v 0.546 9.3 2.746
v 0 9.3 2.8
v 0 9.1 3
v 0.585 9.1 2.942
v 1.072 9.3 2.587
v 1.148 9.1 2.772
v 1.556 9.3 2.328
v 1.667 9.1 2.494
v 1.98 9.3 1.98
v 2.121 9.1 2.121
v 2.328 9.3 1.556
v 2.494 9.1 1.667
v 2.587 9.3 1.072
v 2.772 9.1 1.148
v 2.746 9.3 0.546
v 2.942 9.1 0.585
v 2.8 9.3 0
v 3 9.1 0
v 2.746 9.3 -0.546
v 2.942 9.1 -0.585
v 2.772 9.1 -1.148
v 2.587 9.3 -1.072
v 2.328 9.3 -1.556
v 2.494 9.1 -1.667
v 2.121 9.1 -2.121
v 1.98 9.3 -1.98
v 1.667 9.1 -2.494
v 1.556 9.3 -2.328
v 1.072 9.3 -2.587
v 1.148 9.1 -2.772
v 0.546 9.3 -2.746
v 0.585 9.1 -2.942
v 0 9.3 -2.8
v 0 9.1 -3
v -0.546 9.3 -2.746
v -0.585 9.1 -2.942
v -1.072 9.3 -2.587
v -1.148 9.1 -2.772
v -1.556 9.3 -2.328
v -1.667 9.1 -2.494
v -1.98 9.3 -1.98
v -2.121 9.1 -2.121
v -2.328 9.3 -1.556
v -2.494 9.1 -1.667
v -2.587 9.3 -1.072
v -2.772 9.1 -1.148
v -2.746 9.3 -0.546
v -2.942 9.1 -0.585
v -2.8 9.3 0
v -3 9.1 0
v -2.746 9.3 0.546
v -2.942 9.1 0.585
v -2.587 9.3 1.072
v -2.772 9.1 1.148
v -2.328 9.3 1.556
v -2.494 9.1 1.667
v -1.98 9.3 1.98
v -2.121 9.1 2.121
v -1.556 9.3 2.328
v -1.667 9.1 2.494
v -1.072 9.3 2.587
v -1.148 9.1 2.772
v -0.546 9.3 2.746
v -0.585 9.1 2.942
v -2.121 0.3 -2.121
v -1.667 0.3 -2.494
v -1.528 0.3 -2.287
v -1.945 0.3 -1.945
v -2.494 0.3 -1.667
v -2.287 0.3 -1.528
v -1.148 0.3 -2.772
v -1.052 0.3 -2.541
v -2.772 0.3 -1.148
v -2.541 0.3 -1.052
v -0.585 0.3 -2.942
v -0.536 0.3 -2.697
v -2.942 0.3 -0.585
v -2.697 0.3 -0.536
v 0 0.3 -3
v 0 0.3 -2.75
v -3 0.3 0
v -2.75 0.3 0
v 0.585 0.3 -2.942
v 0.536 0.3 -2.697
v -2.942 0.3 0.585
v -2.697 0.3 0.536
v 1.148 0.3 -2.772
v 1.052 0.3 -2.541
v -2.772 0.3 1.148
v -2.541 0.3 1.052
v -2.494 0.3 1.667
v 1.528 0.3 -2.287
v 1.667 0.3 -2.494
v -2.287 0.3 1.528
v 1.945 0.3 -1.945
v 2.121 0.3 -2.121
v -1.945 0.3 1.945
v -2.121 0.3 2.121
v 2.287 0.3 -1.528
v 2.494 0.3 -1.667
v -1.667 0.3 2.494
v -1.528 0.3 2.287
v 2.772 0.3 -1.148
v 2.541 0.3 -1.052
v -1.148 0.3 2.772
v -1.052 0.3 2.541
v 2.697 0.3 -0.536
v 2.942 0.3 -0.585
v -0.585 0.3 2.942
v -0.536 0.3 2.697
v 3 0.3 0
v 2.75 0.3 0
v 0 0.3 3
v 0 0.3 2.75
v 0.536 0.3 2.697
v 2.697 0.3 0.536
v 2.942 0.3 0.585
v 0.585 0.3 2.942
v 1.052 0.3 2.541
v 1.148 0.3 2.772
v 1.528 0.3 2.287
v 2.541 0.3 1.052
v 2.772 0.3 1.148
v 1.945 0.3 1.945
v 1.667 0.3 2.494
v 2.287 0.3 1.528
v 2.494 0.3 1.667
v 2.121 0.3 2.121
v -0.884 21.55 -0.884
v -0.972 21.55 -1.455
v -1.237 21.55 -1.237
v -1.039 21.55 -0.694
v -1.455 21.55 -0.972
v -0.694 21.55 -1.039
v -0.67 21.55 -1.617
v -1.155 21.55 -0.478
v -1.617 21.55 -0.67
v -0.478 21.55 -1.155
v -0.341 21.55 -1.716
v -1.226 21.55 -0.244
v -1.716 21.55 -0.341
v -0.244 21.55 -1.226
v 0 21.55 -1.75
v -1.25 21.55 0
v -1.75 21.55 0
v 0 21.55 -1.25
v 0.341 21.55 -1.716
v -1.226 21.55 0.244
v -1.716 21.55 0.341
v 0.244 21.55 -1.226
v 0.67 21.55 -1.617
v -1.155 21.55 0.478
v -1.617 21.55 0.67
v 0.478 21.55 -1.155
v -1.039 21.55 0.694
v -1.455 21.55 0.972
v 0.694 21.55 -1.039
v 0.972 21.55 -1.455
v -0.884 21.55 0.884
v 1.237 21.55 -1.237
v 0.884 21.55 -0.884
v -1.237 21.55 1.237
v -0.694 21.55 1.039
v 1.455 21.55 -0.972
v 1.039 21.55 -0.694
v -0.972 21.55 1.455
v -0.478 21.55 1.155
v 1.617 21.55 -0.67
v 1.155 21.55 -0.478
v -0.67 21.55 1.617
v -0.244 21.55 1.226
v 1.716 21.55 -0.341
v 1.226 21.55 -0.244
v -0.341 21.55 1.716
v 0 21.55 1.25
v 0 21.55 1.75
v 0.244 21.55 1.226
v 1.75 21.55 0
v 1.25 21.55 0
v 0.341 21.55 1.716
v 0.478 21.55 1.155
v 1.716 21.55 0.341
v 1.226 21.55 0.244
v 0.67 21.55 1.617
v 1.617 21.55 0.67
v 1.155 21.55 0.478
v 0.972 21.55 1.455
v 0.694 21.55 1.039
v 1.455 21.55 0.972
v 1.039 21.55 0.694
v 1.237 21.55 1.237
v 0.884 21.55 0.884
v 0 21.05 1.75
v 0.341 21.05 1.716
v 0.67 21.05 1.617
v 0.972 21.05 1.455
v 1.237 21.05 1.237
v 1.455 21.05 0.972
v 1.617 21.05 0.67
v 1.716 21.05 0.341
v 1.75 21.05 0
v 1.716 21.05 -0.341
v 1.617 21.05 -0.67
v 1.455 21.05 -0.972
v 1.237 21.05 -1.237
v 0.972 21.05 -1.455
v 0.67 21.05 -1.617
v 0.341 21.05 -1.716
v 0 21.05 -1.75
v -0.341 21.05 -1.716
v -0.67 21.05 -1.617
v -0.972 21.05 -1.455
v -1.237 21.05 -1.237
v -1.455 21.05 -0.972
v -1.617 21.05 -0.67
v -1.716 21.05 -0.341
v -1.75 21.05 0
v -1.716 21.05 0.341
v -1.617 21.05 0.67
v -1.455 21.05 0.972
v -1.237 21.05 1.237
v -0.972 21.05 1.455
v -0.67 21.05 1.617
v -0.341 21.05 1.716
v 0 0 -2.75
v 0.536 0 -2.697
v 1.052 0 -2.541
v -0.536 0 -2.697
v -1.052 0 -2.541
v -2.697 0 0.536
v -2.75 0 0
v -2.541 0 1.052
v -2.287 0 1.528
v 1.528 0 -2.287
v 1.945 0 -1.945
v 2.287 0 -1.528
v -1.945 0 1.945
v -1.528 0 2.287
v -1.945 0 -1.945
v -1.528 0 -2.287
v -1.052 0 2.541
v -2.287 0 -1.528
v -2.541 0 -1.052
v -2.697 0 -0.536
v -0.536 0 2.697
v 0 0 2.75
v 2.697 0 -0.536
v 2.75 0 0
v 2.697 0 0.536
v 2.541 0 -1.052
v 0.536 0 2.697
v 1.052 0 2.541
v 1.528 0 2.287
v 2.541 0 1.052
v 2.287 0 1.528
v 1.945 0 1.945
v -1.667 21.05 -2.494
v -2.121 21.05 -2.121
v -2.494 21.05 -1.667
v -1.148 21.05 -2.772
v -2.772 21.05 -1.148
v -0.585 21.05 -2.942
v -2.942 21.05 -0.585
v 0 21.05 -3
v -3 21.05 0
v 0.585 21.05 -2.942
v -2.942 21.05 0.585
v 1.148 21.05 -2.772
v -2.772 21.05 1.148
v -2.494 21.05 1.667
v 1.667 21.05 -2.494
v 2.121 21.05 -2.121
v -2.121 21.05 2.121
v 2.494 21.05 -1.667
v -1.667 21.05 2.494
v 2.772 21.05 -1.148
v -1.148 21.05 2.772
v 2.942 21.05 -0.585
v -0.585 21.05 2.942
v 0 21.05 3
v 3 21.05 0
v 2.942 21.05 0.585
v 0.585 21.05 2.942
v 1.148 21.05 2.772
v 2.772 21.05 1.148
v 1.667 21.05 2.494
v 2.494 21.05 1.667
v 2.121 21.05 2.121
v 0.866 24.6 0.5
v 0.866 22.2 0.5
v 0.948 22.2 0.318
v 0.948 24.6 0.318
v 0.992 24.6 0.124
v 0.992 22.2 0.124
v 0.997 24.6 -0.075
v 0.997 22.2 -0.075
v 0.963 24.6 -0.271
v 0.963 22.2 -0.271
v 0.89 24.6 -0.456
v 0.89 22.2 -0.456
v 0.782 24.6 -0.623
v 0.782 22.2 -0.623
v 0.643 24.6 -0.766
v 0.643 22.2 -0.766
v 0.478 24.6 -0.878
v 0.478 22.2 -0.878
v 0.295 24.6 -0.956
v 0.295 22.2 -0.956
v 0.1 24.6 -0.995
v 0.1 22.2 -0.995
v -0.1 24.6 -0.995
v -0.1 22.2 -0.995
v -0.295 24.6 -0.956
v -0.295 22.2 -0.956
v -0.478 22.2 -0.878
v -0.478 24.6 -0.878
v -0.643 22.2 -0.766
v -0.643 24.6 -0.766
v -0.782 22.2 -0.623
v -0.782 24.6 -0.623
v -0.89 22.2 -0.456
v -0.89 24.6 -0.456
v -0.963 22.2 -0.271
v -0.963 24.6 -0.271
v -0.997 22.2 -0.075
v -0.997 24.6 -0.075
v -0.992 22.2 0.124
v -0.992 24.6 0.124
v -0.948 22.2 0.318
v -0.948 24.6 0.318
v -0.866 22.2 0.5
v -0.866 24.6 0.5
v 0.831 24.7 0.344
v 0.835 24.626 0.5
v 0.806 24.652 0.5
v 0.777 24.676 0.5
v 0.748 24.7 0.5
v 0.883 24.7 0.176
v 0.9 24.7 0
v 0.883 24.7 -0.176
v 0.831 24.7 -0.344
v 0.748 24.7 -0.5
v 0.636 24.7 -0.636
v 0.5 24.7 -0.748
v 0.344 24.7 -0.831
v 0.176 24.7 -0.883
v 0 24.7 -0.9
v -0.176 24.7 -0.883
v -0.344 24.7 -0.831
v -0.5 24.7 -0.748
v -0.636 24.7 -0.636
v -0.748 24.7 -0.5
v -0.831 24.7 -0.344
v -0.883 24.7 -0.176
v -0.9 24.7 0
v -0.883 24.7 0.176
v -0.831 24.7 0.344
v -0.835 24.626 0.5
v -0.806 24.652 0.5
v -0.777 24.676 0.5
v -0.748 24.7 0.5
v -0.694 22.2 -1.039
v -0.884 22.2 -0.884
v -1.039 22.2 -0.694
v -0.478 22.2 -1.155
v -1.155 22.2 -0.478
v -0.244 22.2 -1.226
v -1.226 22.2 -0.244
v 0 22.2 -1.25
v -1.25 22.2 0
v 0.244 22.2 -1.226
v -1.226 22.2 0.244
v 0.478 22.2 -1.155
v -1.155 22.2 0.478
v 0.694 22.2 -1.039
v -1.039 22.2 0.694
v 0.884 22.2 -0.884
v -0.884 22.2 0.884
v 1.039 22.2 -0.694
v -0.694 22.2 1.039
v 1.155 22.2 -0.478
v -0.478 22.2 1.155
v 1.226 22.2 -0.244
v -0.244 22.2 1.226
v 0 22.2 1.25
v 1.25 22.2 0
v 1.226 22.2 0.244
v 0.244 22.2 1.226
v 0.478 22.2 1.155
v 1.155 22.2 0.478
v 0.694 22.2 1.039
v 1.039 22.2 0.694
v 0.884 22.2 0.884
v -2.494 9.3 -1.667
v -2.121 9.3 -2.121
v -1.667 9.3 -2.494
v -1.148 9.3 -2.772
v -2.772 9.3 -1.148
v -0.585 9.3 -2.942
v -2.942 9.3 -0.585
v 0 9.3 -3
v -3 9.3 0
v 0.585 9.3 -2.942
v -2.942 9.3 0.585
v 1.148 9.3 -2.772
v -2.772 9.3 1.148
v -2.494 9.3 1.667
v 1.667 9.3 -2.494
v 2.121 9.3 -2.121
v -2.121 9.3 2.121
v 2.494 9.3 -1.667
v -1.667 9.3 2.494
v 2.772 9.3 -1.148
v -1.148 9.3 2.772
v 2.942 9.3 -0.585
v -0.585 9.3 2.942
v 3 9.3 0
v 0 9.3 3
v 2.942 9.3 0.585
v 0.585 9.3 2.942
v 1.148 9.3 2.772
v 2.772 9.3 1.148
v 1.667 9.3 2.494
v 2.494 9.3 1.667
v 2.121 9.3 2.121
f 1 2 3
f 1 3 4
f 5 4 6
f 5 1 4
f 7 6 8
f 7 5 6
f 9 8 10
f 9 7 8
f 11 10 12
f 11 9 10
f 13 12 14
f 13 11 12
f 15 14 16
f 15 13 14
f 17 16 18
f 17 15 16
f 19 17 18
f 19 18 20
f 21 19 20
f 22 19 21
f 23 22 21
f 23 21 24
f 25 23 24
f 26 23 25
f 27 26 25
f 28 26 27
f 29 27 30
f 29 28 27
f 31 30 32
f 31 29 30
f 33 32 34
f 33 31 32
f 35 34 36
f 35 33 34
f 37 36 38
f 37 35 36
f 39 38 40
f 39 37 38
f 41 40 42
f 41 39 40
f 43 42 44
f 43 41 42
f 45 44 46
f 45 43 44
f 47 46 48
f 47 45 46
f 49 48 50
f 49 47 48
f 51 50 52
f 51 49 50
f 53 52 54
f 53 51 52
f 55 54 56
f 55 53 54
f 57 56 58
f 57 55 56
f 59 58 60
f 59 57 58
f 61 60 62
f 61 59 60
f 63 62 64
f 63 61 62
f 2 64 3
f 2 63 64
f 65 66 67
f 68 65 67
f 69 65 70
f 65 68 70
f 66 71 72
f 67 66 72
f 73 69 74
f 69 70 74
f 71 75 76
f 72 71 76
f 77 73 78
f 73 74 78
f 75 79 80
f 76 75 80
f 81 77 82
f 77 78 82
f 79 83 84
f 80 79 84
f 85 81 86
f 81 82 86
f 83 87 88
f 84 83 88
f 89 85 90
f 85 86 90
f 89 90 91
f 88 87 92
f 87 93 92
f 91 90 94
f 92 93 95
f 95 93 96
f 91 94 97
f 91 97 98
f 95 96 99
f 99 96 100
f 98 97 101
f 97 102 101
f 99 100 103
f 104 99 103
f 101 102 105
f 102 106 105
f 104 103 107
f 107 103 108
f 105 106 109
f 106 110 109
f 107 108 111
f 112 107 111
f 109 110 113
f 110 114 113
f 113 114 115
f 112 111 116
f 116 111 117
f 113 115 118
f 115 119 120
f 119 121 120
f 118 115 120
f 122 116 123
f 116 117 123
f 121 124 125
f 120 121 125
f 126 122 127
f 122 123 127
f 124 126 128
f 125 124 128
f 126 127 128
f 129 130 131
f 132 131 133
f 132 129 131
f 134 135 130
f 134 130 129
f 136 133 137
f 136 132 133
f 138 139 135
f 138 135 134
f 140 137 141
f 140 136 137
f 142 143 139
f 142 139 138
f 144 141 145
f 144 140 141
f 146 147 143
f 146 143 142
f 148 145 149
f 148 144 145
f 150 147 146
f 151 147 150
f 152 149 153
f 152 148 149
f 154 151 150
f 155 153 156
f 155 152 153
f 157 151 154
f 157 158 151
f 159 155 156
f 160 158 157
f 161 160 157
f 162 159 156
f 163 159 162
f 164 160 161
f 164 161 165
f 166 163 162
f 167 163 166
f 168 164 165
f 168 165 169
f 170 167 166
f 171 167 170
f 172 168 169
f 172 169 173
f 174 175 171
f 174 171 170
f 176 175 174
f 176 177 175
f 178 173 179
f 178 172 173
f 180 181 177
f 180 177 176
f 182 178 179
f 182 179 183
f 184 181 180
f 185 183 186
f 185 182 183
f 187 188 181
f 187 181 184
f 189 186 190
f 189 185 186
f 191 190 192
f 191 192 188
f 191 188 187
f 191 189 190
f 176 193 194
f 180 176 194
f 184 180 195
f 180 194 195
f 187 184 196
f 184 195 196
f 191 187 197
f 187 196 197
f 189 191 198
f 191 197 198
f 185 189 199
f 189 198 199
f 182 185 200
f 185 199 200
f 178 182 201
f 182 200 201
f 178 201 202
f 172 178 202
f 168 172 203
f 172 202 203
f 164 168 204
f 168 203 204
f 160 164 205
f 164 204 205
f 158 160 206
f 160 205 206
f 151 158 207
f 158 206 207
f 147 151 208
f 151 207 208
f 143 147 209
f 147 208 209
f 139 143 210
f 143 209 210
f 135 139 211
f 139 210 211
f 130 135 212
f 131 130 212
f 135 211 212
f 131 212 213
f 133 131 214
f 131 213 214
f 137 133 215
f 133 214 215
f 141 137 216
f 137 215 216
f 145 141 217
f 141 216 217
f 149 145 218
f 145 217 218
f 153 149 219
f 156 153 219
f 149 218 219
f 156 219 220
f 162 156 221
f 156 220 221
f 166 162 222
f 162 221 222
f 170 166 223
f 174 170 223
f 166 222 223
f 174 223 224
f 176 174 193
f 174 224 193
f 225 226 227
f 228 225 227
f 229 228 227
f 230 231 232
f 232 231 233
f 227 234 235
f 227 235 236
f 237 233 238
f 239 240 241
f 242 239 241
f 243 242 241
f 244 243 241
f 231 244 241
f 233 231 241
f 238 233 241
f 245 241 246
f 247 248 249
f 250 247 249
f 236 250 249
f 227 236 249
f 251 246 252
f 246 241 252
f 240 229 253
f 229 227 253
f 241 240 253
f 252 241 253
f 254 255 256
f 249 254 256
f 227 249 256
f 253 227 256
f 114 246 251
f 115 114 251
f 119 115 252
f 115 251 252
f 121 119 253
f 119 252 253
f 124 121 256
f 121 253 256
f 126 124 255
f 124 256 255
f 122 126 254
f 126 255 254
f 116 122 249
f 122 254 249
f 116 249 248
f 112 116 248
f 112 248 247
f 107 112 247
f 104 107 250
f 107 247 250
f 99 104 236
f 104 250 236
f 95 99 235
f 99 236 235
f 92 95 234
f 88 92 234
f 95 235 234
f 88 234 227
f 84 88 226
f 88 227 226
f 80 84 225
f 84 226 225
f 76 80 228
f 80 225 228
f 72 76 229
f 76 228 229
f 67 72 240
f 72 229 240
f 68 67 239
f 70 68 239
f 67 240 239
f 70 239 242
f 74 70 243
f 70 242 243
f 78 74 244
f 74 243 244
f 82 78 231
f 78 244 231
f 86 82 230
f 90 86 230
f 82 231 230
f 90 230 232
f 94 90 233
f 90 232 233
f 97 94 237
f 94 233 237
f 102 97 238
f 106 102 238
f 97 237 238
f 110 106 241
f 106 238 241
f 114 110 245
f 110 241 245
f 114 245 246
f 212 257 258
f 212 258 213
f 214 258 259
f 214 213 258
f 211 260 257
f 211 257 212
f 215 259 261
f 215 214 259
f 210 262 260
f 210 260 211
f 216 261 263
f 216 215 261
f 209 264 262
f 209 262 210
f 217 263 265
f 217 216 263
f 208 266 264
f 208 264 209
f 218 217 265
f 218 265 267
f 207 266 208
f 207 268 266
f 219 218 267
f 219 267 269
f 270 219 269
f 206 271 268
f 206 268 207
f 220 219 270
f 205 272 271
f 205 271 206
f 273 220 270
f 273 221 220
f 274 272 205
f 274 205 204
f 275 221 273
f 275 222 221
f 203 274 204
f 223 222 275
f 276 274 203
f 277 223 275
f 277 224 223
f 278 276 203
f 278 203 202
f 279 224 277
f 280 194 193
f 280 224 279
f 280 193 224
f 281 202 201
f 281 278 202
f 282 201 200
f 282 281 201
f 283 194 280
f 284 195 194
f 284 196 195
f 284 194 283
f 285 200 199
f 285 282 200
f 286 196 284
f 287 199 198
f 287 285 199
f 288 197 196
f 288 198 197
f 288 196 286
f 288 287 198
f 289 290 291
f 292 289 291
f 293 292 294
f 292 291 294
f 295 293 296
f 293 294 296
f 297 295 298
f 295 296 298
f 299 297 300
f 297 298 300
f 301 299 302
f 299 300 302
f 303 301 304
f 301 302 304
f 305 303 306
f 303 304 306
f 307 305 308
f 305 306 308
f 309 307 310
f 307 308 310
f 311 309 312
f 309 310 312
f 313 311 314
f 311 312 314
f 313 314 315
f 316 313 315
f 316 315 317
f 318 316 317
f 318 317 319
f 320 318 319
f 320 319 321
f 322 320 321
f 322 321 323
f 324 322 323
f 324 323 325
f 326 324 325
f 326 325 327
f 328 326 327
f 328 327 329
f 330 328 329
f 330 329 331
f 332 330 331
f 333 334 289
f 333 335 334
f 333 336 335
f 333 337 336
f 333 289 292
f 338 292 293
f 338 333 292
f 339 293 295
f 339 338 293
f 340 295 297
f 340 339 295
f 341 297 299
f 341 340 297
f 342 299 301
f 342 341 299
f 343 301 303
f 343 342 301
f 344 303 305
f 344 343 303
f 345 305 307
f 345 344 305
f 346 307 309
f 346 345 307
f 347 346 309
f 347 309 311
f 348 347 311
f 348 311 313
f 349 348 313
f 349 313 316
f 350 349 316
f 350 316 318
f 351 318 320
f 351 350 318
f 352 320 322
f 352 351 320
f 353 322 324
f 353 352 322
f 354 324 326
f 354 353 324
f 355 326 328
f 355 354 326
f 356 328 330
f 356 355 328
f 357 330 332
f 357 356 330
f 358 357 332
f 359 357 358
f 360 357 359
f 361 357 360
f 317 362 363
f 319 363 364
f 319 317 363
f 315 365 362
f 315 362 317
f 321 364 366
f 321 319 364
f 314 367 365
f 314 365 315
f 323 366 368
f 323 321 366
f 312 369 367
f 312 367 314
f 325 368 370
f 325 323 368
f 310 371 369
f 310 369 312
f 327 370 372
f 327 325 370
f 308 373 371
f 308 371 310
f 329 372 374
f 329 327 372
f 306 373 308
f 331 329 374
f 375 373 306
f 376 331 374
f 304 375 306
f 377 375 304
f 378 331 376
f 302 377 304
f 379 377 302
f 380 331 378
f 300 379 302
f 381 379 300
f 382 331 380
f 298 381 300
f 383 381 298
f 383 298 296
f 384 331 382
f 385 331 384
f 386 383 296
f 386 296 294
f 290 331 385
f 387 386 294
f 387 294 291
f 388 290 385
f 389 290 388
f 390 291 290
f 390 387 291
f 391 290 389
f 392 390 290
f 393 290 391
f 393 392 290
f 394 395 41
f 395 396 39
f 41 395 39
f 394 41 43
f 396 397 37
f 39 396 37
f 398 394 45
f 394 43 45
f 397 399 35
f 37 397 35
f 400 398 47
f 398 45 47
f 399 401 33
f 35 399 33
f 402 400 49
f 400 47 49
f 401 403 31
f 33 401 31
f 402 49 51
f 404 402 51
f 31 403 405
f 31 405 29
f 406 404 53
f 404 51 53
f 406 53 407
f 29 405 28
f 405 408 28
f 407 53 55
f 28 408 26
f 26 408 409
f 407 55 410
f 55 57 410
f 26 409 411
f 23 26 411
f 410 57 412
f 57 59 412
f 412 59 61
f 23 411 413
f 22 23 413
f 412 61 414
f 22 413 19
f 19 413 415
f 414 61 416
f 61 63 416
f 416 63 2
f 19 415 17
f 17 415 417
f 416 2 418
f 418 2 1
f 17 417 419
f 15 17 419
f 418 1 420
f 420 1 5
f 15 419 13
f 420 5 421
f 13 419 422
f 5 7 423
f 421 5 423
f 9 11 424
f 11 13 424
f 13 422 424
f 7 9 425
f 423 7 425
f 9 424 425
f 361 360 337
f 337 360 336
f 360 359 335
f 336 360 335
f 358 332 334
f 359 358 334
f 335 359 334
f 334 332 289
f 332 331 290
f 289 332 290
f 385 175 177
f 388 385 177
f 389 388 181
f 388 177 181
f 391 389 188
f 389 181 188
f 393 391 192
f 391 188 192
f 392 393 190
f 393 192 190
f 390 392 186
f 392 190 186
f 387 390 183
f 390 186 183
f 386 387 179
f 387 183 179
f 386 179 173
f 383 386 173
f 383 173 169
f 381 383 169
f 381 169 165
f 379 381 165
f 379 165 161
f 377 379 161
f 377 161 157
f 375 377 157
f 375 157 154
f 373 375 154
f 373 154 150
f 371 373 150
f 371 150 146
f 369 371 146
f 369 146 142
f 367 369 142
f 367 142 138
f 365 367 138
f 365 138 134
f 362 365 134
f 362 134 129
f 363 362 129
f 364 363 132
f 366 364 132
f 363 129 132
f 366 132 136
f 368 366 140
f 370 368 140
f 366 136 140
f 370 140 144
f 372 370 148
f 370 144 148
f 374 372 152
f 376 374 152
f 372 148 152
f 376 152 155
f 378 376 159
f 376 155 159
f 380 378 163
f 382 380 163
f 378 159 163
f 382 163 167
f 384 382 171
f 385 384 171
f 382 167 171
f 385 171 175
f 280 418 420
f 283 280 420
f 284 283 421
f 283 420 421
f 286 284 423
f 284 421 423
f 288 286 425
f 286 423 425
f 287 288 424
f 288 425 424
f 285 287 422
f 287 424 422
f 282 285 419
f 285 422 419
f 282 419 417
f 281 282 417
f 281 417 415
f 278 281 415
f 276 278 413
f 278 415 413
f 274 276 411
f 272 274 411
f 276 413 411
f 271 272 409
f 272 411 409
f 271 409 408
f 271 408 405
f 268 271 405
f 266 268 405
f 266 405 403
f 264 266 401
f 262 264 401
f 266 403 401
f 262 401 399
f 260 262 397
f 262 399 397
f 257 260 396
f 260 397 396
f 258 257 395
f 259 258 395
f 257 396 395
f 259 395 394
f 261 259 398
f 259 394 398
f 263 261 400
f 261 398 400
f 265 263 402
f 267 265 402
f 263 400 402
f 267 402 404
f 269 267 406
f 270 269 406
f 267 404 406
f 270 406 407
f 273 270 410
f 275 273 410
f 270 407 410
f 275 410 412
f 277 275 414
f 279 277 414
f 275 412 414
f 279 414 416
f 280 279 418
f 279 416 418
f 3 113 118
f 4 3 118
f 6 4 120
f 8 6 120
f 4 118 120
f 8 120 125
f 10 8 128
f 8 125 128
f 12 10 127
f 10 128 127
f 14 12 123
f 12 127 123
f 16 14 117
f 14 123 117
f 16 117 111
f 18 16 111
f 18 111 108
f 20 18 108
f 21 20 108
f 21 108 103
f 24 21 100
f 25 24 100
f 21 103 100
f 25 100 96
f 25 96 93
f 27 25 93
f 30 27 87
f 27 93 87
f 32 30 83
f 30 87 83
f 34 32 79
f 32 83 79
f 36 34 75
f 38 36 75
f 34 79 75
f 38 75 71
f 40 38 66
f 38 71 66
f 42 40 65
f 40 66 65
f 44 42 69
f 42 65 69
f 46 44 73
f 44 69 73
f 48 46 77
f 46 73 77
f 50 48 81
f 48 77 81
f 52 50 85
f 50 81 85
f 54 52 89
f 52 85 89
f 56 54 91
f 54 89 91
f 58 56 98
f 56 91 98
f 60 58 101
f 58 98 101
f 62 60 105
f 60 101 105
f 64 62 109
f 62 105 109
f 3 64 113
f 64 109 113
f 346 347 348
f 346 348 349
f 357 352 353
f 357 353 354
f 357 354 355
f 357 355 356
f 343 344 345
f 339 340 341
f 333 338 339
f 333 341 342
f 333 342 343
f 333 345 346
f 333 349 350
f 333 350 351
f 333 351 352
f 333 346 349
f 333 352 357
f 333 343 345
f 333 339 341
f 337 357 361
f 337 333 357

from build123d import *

# Parameters (mm, degrees)
SKETCH_1_R          = 2.75
EXTRUDE_1_DEPTH     = 0.3
EXTRUDE_START       = 0.3
SKETCH_2_R          = 3
EXTRUDE_2_DEPTH     = 9
CHAMFER_1_SIZE      = 0.2
EXTRUDE_START_2     = 9.3
SKETCH_3_R          = 3
EXTRUDE_3_DEPTH     = 11.75
EXTRUDE_START_3     = 21.05
SKETCH_4_R          = 1.75
EXTRUDE_4_DEPTH     = 0.5
SKETCH_5_R          = 1.25
EXTRUDE_5_DEPTH     = 1.15
SKETCH_6_R          = 1
EXTRUDE_6_DEPTH     = 3.65
CUT_EXTRUDE_START   = 22.2
CUT_EXTRUDE_1_DEPTH = 2.5
CHAMFER_2_SIZE      = 0.1


with BuildPart() as part:
    # 草图1 → 凸台-拉伸1 (new body)
    with BuildSketch(Plane(origin=(0, 0, 0), x_dir=(1, 0, 0), z_dir=(0, 1, 0))):
        with Locations(Location((0, 0, 0), (0, 0, 270))):
            Circle(SKETCH_1_R)
    extrude(amount=EXTRUDE_1_DEPTH)

    # 草图2 → 凸台-拉伸2 (add)
    with BuildSketch(Plane(origin=(0, 0, 0), x_dir=(1, 0, 0), z_dir=(0, 1, 0)).offset(EXTRUDE_START)):
        with Locations(Location((0, 0, 0), (0, 0, 270))):
            Circle(SKETCH_2_R)
    extrude(amount=EXTRUDE_2_DEPTH)

    # 倒角1
    chamfer_1_edges = [part.edges().sort_by_distance(p)[0] for p in [
        (0, 9.3, -3),
    ]]
    chamfer(chamfer_1_edges, length=CHAMFER_1_SIZE)

    # 草图3 → 凸台-拉伸3 (add)
    with BuildSketch(Plane(origin=(0, 0, 0), x_dir=(1, 0, 0), z_dir=(0, 1, 0)).offset(EXTRUDE_START_2)):
        with Locations(Location((0, 0, 0), (0, 0, 270))):
            Circle(SKETCH_3_R)
    extrude(amount=EXTRUDE_3_DEPTH)

    # 草图4 → 凸台-拉伸4 (add)
    with BuildSketch(Plane(origin=(0, 0, 0), x_dir=(1, 0, 0), z_dir=(0, 1, 0)).offset(EXTRUDE_START_3)):
        with Locations(Location((0, 0, 0), (0, 0, 270))):
            Circle(SKETCH_4_R)
    extrude(amount=EXTRUDE_4_DEPTH)

    # 草图5 → 凸台-拉伸5 (add)
    with BuildSketch(Plane(origin=(0, 0, 0), x_dir=(1, 0, 0), z_dir=(0, 1, 0)).offset(EXTRUDE_START_3)):
        with Locations(Location((0, 0, 0), (0, 0, 270))):
            Circle(SKETCH_5_R)
    extrude(amount=EXTRUDE_5_DEPTH)

    # 草图6 → 凸台-拉伸6 (add)
    with BuildSketch(Plane(origin=(0, 0, 0), x_dir=(1, 0, 0), z_dir=(0, 1, 0)).offset(EXTRUDE_START_3)):
        with Locations(Location((0, 0, 0), (0, 0, 270))):
            Circle(SKETCH_6_R)
    extrude(amount=EXTRUDE_6_DEPTH)

    # 草图7 → 切除-拉伸1 (cut)
    with BuildSketch(Plane(origin=(0, 0, 0), x_dir=(1, 0, 0), z_dir=(0, 1, 0)).offset(CUT_EXTRUDE_START)):
        with BuildLine():
            Line((-0.866025404, -0.5), (0.866025404, -0.5))
            ThreePointArc((0.866025404, -0.5), (0, -1), (-0.866025404, -0.5))
        make_face()
    extrude(amount=CUT_EXTRUDE_1_DEPTH, mode=Mode.SUBTRACT)

    # 倒角2
    chamfer_2_edges = [part.edges().sort_by_distance(p)[0] for p in [
        (0, 24.7, -1),
    ]]
    chamfer(chamfer_2_edges, length=CHAMFER_2_SIZE)


solid = part.part
